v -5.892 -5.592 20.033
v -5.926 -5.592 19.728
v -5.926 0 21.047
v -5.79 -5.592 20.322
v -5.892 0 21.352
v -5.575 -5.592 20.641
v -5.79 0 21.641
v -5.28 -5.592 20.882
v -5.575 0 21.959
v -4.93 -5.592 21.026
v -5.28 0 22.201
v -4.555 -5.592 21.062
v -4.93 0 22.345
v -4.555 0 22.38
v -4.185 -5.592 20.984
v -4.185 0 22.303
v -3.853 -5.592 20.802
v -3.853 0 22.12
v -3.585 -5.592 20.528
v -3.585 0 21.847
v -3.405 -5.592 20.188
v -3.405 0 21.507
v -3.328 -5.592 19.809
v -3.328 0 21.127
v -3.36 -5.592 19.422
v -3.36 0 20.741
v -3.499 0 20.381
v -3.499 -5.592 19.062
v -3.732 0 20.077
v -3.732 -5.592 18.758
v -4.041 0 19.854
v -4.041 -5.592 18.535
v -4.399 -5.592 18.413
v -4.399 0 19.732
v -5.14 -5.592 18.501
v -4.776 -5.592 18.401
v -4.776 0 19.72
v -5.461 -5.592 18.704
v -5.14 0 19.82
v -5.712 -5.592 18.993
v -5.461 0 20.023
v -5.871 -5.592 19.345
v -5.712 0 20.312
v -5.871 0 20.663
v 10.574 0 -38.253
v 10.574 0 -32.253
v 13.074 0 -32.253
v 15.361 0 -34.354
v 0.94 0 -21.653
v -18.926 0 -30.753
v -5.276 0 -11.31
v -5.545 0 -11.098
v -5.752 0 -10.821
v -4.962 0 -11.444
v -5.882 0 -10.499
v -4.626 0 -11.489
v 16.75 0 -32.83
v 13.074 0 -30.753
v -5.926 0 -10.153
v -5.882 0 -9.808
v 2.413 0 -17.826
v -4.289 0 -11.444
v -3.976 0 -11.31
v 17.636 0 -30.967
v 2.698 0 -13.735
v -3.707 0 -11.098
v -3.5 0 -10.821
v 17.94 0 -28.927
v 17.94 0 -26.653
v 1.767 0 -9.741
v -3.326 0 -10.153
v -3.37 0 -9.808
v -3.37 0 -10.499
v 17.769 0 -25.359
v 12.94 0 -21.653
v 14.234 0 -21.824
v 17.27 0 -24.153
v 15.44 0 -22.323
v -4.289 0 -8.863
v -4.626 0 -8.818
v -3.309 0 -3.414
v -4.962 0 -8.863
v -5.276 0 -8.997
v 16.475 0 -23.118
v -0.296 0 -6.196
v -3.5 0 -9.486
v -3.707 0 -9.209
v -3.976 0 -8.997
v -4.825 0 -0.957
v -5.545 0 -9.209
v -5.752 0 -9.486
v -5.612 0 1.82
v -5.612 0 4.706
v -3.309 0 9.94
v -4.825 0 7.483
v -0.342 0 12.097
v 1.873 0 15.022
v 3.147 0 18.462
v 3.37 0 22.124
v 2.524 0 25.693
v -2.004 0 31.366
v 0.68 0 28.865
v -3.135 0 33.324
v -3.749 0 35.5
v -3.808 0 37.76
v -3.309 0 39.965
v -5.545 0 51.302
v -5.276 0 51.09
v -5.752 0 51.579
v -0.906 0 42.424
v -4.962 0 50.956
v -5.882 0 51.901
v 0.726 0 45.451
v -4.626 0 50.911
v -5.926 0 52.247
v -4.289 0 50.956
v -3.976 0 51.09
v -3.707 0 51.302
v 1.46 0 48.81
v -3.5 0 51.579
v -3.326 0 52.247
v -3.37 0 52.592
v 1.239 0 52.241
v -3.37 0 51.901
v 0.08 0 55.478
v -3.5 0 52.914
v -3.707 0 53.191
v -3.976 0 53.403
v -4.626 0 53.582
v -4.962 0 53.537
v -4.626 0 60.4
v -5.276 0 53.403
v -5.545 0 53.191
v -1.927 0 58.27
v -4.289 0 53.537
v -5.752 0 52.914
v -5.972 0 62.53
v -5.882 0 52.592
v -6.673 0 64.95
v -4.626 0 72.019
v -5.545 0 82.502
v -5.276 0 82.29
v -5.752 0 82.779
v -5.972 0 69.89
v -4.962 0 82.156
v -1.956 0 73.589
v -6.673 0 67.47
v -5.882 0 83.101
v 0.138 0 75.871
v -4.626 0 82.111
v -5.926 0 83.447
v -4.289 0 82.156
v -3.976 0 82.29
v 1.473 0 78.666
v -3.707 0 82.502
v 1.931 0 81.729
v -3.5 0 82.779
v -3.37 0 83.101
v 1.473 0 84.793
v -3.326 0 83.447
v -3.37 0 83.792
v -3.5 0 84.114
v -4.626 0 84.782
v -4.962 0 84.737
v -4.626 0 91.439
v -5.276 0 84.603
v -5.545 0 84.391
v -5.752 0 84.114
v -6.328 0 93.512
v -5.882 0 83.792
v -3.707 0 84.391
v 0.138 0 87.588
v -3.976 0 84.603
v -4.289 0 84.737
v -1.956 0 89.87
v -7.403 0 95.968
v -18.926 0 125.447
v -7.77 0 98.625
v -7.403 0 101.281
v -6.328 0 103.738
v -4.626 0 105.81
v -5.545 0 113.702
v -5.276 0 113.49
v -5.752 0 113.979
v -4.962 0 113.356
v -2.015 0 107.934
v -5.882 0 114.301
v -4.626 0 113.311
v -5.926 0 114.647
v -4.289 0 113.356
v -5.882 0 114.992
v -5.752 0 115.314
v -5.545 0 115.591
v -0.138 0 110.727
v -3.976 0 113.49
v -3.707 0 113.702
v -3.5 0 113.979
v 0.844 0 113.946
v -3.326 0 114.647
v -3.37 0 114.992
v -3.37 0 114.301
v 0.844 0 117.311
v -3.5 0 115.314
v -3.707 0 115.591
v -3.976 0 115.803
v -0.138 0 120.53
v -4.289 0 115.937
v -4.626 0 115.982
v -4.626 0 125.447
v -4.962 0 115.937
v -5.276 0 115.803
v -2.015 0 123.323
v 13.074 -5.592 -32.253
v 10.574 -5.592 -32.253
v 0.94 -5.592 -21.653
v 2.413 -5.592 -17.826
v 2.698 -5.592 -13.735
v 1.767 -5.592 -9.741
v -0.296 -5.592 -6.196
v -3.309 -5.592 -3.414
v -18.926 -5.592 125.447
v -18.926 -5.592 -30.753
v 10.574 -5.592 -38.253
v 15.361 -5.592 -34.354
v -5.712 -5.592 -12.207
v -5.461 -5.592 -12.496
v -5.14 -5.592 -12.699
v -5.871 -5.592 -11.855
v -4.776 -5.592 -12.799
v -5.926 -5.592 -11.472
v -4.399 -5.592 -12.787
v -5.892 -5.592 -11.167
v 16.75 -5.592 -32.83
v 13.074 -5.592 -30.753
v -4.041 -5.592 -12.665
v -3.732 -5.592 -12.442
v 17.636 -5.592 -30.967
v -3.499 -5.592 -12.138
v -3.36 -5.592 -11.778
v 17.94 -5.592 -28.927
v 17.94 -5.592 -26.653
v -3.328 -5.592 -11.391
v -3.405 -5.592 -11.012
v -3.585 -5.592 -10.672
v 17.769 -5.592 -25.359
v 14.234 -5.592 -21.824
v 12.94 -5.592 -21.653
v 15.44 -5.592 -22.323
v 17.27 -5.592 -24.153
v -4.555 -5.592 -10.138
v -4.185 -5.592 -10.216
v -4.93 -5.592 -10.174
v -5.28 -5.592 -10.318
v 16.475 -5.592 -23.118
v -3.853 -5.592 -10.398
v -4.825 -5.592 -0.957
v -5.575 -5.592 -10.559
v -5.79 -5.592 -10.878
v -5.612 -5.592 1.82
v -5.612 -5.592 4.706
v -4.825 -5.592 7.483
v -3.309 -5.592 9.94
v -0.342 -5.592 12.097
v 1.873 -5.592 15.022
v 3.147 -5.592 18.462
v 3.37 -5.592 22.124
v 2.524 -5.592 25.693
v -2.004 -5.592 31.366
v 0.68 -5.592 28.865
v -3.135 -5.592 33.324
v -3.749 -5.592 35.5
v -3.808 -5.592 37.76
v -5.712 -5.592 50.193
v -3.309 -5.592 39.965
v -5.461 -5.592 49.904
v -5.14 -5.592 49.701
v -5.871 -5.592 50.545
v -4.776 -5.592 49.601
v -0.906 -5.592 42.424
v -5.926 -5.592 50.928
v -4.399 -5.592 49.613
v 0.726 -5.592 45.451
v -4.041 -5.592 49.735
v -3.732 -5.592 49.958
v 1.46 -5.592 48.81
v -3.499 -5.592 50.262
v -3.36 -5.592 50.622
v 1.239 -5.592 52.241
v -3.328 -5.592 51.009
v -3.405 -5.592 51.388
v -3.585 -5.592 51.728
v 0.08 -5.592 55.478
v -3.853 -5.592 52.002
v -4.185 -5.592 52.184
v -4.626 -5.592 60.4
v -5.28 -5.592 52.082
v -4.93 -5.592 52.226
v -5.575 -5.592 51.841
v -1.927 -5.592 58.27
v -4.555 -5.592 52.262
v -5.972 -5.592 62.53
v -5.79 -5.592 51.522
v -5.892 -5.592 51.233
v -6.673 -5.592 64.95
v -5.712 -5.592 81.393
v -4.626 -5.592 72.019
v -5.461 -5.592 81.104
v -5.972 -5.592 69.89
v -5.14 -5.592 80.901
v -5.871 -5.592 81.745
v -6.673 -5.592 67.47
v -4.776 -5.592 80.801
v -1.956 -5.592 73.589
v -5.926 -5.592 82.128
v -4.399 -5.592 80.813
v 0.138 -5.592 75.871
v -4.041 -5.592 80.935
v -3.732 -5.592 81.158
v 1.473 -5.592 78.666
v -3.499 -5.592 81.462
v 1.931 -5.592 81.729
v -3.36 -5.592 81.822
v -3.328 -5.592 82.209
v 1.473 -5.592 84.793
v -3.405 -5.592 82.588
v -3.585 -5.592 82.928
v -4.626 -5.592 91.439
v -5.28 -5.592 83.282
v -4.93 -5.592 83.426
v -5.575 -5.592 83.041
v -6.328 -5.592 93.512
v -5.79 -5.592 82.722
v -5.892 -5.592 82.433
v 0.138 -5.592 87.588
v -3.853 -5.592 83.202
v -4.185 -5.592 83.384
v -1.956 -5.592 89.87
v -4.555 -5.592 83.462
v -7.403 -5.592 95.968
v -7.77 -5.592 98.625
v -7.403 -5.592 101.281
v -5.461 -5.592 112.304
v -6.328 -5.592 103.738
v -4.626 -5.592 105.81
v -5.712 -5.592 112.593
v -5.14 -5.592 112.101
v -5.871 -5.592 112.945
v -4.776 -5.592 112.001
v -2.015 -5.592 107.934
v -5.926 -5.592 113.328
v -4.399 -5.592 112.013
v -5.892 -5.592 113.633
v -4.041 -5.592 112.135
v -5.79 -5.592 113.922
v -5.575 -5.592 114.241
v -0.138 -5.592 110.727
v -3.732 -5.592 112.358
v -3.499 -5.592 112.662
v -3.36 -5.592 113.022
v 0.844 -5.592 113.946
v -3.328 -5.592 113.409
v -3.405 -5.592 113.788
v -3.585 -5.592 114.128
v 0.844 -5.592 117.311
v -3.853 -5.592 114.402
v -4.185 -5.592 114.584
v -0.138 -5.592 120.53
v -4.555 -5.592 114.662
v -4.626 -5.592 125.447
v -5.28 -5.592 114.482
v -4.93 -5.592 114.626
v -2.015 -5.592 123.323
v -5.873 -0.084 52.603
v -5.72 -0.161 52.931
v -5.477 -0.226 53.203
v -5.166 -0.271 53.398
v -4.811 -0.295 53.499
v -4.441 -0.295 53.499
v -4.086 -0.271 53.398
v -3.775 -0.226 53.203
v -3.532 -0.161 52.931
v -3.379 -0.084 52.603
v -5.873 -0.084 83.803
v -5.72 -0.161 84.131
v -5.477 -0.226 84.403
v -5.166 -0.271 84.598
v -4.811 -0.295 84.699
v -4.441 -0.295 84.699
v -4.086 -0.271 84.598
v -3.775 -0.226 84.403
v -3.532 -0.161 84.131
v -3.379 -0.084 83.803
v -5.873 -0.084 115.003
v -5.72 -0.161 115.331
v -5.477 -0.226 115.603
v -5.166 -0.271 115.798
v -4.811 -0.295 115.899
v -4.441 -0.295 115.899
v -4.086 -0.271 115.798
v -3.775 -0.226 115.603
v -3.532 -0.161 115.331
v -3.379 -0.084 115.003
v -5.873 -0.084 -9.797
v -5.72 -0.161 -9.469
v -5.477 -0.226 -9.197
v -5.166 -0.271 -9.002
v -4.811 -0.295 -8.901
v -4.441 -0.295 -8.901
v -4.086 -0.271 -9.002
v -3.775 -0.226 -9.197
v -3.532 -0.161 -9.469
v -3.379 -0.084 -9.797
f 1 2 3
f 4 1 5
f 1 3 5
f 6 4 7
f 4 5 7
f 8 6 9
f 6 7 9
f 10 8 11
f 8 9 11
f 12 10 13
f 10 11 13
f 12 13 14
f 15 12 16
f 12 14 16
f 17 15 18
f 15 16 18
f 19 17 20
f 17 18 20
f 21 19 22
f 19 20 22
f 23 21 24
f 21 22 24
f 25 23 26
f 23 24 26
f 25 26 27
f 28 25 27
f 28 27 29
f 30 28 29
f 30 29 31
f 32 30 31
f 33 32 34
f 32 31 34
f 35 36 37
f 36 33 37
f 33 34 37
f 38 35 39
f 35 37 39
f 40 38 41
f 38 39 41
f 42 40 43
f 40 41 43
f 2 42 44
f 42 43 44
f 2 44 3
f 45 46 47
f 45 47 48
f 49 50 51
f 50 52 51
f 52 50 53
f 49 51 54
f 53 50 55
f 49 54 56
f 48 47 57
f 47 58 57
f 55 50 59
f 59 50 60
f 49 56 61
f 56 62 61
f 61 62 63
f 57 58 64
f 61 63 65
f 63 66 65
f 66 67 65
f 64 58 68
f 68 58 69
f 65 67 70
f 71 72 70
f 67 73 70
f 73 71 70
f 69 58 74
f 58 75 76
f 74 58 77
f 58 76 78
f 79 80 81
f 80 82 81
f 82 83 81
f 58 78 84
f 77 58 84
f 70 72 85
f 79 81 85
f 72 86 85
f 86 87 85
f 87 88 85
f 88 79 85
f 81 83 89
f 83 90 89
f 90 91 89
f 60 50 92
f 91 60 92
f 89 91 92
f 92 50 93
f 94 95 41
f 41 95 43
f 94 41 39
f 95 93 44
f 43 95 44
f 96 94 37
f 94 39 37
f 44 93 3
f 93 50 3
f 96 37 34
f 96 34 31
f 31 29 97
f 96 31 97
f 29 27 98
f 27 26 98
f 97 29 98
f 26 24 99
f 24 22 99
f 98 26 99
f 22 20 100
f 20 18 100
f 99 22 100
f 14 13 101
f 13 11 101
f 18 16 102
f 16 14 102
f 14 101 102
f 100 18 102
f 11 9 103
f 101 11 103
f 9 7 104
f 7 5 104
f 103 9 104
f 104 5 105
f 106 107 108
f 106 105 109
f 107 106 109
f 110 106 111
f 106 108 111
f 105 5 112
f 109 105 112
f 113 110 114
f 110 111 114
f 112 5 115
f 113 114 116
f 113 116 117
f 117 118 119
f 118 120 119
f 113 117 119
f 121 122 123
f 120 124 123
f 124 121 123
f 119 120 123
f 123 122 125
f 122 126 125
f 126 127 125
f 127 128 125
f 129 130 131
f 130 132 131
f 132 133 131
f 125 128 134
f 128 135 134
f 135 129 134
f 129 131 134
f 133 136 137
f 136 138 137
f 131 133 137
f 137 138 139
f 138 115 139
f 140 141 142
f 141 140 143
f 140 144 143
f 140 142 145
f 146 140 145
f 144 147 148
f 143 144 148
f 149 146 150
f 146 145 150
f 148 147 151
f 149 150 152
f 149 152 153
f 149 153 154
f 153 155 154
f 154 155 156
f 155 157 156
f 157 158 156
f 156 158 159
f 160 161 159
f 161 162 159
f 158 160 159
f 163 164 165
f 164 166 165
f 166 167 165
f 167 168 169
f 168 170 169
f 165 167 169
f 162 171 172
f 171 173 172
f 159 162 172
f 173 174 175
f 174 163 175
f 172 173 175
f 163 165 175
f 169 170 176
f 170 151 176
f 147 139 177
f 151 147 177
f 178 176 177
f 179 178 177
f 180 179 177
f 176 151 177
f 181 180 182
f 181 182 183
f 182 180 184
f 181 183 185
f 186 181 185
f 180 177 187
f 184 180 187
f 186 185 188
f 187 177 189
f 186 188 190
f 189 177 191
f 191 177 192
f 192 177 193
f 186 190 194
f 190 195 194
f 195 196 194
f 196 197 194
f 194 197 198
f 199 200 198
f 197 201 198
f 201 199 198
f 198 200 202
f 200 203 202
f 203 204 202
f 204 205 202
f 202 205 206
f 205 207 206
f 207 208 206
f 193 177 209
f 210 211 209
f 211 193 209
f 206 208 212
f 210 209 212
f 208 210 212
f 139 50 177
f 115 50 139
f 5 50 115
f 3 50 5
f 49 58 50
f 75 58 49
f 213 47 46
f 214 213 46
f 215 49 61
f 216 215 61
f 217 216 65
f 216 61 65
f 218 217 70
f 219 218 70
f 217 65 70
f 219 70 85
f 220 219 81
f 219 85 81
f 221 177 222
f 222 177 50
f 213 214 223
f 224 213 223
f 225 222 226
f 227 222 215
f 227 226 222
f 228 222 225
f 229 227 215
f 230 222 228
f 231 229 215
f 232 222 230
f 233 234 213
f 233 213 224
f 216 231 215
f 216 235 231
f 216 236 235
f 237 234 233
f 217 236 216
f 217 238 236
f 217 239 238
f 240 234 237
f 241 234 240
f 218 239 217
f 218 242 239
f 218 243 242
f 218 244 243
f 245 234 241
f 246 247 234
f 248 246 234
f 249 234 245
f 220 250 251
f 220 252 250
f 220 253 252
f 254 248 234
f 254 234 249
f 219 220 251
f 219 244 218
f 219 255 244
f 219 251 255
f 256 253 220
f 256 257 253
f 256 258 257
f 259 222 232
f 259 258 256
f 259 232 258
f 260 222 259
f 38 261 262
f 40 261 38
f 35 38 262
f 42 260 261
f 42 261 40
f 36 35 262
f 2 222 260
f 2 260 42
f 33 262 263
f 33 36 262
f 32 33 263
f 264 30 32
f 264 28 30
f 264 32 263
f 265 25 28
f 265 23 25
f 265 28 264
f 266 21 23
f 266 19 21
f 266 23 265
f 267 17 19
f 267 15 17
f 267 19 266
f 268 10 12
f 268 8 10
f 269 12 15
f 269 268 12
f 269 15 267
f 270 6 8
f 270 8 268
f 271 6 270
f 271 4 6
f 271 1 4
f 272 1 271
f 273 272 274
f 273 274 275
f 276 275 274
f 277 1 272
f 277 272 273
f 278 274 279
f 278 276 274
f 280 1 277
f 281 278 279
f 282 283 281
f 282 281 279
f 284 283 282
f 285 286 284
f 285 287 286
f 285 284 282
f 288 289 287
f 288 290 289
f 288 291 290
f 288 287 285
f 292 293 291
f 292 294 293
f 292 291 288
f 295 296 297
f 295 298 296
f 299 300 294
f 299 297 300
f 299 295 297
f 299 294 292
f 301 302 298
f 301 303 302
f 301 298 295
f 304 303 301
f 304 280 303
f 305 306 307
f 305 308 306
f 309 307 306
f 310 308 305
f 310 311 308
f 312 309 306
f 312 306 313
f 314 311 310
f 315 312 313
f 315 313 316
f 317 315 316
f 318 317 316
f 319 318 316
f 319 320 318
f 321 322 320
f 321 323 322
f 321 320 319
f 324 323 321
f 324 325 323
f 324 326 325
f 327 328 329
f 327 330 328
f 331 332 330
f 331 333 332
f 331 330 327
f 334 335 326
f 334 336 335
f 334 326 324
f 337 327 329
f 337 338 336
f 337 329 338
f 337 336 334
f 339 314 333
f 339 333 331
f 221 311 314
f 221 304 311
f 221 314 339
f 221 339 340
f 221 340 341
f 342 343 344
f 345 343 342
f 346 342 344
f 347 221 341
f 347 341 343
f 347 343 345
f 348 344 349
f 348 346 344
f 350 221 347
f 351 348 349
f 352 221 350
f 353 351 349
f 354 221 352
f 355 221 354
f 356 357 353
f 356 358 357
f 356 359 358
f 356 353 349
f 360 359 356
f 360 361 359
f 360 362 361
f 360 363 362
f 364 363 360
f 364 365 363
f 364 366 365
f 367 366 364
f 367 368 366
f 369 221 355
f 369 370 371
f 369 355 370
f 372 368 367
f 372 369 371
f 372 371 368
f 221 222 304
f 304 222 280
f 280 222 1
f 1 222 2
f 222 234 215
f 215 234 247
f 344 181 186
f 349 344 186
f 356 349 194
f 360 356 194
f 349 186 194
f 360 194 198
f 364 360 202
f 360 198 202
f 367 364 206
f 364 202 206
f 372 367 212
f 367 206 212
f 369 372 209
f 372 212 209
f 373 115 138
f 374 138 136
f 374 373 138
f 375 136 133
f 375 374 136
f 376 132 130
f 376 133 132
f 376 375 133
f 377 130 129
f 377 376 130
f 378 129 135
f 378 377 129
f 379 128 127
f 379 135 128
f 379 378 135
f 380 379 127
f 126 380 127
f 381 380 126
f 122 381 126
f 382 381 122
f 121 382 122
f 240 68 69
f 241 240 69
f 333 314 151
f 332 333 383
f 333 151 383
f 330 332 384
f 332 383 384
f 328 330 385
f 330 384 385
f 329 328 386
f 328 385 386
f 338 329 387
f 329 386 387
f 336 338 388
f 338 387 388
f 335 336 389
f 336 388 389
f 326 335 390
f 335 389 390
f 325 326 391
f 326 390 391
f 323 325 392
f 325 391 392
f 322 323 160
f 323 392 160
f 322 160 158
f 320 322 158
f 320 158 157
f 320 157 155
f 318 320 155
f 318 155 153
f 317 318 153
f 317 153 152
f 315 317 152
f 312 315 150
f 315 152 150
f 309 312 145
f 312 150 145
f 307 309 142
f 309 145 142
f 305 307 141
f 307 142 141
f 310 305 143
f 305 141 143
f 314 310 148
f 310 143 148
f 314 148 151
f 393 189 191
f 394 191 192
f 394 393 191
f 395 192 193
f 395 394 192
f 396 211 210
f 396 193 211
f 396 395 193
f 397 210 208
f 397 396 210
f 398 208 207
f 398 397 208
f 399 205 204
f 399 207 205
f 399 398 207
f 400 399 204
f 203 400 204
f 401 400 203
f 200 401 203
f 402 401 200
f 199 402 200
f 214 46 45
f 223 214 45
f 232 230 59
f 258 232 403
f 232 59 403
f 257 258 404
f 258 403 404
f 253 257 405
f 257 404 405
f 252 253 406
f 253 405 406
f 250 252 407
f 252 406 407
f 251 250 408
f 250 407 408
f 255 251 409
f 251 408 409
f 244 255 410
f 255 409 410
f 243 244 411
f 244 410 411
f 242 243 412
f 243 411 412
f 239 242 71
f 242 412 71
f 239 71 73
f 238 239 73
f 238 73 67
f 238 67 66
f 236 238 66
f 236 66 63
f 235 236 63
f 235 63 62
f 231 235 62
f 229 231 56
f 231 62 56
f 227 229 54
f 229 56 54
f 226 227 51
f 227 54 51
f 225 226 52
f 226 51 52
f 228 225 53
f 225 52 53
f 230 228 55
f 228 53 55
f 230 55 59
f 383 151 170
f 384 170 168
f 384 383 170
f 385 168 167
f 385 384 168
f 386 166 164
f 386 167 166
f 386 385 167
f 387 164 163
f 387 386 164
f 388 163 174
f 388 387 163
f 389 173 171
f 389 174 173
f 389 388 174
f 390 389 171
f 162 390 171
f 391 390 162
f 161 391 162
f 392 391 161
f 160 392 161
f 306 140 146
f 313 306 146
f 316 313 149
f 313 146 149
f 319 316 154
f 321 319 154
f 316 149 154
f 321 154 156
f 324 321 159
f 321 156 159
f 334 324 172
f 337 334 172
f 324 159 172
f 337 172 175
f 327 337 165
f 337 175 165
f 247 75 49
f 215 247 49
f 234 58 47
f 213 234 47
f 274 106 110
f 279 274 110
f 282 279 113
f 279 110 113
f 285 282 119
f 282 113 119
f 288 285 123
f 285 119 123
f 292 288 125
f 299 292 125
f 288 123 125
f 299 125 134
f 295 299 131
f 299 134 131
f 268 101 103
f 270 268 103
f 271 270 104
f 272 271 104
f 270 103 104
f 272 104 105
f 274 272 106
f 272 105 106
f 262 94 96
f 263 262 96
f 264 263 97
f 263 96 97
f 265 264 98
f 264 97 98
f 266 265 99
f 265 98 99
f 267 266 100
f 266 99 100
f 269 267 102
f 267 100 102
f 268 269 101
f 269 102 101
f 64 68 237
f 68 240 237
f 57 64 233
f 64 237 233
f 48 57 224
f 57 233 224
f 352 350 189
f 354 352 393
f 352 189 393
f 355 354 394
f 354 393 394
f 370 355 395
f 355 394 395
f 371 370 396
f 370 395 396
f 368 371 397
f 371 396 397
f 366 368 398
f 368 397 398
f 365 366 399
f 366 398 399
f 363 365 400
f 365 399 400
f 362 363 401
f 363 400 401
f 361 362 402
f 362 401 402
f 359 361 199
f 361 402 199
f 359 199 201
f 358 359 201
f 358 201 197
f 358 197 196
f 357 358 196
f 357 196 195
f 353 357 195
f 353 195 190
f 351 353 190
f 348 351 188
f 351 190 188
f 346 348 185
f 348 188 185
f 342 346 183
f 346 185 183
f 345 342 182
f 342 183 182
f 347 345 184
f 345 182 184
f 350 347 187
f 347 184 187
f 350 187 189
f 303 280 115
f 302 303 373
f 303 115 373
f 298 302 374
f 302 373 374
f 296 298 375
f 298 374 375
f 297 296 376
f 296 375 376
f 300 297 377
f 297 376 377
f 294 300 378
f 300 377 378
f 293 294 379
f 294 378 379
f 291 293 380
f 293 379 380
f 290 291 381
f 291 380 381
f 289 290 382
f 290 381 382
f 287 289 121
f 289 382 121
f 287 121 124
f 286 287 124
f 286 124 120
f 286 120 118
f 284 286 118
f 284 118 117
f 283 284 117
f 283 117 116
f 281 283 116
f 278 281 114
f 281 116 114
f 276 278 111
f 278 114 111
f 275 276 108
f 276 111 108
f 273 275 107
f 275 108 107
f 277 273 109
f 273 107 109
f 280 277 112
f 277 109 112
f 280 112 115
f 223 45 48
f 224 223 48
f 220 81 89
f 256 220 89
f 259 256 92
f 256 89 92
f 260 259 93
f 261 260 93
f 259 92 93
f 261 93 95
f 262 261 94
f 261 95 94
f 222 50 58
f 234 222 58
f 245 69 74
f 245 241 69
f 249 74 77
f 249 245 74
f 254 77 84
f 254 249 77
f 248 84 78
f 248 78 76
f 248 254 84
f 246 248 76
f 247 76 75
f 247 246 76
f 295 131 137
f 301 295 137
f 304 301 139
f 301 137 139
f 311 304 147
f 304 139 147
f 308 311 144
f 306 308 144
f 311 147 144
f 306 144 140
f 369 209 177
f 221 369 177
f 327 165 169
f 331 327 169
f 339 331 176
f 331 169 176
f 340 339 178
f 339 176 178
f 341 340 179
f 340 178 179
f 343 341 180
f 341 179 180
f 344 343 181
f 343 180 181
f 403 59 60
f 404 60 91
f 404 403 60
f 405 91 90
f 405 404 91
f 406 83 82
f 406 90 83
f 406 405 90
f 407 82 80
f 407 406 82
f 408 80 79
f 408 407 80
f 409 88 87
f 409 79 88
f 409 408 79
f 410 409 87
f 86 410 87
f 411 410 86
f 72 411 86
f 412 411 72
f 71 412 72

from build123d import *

# Parameters (mm, degrees)
F11_DEPTH = 5.59188
F6_R      = 1.3
F10_R     = 1.3
F9_R      = 1.3
F8_R      = 1.3
F7_R      = 1.3
F12_DEPTH = 12.5
F13_R     = 5
F14_R     = 7


with BuildPart() as f11:
    # F0 (on Front) → F11 (new body)
    with BuildSketch(Plane.XZ):
        with BuildLine():
            Line((-4.6259572574, 125.4466459383), (-18.9259572574, 125.4466459383))
            Line((-18.9259572574, 125.4466459383), (-18.9259572574, -30.7533540617))
            Line((-18.9259572574, -30.7533540617), (13.0740427426, -30.7533540617))
            Line((13.0740427426, -30.7533540617), (13.0740427426, -32.2533540617))
            Line((13.0740427426, -32.2533540617), (10.5740427426, -32.2533540617))
            Line((10.5740427426, -32.2533540617), (10.5740427426, -38.2533540617))
            Line((10.5740427426, -38.2533540617), (17.9395026739, -32.2533540617))
            Line((17.9395026739, -32.2533540617), (17.9395026739, -21.6533540617))
            Line((17.9395026739, -21.6533540617), (0.9395026739, -21.6533540617))
            ThreePointArc((0.9395026739, -21.6533540617), (2.3818043878, -11.7029252546), (-3.3089759276, -3.413999686))
            ThreePointArc((-3.3089759276, -3.413999686), (-5.7123935665, 3.262952785), (-3.3089759276, 9.939905256))
            ThreePointArc((-3.3089759276, 9.939905256), (3.3934420485, 20.2845633982), (-2.0037802352, 31.3662758301))
            ThreePointArc((-2.0037802352, 31.3662758301), (-3.7485817849, 35.5000324433), (-3.3089759276, 39.9653457441))
            ThreePointArc((-3.3089759276, 39.9653457441), (1.4696935081, 50.5333149606), (-4.6259572574, 60.4004673705))
            ThreePointArc((-4.6259572574, 60.4004673705), (-6.7621279189, 66.2099556499), (-4.6259572574, 72.0194439292))
            ThreePointArc((-4.6259572574, 72.0194439292), (1.9308894563, 81.7293683887), (-4.6259572574, 91.4392928481))
            ThreePointArc((-4.6259572574, 91.4392928481), (-7.770265303, 98.6246365011), (-4.6259572574, 105.809980154))
            ThreePointArc((-4.6259572574, 105.809980154), (0.9684001504, 115.6283130462), (-4.6259572574, 125.4466459383))
        make_face()
    extrude(amount=F11_DEPTH)

    # F6 (on line) + F10 (on line) + F9 (on line) + F8 (on line) + F7 (on line) → F12 (cut, symmetric)
    with BuildSketch(Plane(origin=(0, -2.2683734534, -0.5349668297), x_dir=(-1, 0, 0), z_dir=(0, 0.9732991931, 0.2295401504))):
        with Locations((4.6259572574, -9.8822513158)):
            Circle(F6_R)
    with BuildSketch(Plane(origin=(0, 25.6133496961, 6.0405805155), x_dir=(-1, 0, 0), z_dir=(0, 0.9732991931, 0.2295401504))):
        with Locations((4.6259572574, 111.5854879869)):
            Circle(F10_R)
    with BuildSketch(Plane(origin=(0, 18.6429189088, 4.3966936792), x_dir=(-1, 0, 0), z_dir=(0, 0.9732991931, 0.2295401504))):
        with Locations((4.6259572574, 81.2185531612)):
            Circle(F9_R)
    with BuildSketch(Plane(origin=(0, 11.6724881214, 2.7528068429), x_dir=(-1, 0, 0), z_dir=(0, 0.9732991931, 0.2295401504))):
        with Locations((4.6259572574, 50.8516183356)):
            Circle(F8_R)
    with BuildSketch(Plane(origin=(0, 4.702057334, 1.1089200066), x_dir=(-1, 0, 0), z_dir=(0, 0.9732991931, 0.2295401504))):
        with Locations((4.6259572574, 20.4846835099)):
            Circle(F7_R)
    extrude(amount=F12_DEPTH, both=True, mode=Mode.SUBTRACT)

    # F13
    f13_edges = [f11.edges().sort_by_distance(p)[0] for p in [
        (17.939503, -2.79594, -21.653354),
    ]]
    fillet(f13_edges, radius=F13_R)

    # F14
    f14_edges = [f11.edges().sort_by_distance(p)[0] for p in [
        (17.939503, -2.79594, -32.253354),
    ]]
    fillet(f14_edges, radius=F14_R)


solid = f11.part
